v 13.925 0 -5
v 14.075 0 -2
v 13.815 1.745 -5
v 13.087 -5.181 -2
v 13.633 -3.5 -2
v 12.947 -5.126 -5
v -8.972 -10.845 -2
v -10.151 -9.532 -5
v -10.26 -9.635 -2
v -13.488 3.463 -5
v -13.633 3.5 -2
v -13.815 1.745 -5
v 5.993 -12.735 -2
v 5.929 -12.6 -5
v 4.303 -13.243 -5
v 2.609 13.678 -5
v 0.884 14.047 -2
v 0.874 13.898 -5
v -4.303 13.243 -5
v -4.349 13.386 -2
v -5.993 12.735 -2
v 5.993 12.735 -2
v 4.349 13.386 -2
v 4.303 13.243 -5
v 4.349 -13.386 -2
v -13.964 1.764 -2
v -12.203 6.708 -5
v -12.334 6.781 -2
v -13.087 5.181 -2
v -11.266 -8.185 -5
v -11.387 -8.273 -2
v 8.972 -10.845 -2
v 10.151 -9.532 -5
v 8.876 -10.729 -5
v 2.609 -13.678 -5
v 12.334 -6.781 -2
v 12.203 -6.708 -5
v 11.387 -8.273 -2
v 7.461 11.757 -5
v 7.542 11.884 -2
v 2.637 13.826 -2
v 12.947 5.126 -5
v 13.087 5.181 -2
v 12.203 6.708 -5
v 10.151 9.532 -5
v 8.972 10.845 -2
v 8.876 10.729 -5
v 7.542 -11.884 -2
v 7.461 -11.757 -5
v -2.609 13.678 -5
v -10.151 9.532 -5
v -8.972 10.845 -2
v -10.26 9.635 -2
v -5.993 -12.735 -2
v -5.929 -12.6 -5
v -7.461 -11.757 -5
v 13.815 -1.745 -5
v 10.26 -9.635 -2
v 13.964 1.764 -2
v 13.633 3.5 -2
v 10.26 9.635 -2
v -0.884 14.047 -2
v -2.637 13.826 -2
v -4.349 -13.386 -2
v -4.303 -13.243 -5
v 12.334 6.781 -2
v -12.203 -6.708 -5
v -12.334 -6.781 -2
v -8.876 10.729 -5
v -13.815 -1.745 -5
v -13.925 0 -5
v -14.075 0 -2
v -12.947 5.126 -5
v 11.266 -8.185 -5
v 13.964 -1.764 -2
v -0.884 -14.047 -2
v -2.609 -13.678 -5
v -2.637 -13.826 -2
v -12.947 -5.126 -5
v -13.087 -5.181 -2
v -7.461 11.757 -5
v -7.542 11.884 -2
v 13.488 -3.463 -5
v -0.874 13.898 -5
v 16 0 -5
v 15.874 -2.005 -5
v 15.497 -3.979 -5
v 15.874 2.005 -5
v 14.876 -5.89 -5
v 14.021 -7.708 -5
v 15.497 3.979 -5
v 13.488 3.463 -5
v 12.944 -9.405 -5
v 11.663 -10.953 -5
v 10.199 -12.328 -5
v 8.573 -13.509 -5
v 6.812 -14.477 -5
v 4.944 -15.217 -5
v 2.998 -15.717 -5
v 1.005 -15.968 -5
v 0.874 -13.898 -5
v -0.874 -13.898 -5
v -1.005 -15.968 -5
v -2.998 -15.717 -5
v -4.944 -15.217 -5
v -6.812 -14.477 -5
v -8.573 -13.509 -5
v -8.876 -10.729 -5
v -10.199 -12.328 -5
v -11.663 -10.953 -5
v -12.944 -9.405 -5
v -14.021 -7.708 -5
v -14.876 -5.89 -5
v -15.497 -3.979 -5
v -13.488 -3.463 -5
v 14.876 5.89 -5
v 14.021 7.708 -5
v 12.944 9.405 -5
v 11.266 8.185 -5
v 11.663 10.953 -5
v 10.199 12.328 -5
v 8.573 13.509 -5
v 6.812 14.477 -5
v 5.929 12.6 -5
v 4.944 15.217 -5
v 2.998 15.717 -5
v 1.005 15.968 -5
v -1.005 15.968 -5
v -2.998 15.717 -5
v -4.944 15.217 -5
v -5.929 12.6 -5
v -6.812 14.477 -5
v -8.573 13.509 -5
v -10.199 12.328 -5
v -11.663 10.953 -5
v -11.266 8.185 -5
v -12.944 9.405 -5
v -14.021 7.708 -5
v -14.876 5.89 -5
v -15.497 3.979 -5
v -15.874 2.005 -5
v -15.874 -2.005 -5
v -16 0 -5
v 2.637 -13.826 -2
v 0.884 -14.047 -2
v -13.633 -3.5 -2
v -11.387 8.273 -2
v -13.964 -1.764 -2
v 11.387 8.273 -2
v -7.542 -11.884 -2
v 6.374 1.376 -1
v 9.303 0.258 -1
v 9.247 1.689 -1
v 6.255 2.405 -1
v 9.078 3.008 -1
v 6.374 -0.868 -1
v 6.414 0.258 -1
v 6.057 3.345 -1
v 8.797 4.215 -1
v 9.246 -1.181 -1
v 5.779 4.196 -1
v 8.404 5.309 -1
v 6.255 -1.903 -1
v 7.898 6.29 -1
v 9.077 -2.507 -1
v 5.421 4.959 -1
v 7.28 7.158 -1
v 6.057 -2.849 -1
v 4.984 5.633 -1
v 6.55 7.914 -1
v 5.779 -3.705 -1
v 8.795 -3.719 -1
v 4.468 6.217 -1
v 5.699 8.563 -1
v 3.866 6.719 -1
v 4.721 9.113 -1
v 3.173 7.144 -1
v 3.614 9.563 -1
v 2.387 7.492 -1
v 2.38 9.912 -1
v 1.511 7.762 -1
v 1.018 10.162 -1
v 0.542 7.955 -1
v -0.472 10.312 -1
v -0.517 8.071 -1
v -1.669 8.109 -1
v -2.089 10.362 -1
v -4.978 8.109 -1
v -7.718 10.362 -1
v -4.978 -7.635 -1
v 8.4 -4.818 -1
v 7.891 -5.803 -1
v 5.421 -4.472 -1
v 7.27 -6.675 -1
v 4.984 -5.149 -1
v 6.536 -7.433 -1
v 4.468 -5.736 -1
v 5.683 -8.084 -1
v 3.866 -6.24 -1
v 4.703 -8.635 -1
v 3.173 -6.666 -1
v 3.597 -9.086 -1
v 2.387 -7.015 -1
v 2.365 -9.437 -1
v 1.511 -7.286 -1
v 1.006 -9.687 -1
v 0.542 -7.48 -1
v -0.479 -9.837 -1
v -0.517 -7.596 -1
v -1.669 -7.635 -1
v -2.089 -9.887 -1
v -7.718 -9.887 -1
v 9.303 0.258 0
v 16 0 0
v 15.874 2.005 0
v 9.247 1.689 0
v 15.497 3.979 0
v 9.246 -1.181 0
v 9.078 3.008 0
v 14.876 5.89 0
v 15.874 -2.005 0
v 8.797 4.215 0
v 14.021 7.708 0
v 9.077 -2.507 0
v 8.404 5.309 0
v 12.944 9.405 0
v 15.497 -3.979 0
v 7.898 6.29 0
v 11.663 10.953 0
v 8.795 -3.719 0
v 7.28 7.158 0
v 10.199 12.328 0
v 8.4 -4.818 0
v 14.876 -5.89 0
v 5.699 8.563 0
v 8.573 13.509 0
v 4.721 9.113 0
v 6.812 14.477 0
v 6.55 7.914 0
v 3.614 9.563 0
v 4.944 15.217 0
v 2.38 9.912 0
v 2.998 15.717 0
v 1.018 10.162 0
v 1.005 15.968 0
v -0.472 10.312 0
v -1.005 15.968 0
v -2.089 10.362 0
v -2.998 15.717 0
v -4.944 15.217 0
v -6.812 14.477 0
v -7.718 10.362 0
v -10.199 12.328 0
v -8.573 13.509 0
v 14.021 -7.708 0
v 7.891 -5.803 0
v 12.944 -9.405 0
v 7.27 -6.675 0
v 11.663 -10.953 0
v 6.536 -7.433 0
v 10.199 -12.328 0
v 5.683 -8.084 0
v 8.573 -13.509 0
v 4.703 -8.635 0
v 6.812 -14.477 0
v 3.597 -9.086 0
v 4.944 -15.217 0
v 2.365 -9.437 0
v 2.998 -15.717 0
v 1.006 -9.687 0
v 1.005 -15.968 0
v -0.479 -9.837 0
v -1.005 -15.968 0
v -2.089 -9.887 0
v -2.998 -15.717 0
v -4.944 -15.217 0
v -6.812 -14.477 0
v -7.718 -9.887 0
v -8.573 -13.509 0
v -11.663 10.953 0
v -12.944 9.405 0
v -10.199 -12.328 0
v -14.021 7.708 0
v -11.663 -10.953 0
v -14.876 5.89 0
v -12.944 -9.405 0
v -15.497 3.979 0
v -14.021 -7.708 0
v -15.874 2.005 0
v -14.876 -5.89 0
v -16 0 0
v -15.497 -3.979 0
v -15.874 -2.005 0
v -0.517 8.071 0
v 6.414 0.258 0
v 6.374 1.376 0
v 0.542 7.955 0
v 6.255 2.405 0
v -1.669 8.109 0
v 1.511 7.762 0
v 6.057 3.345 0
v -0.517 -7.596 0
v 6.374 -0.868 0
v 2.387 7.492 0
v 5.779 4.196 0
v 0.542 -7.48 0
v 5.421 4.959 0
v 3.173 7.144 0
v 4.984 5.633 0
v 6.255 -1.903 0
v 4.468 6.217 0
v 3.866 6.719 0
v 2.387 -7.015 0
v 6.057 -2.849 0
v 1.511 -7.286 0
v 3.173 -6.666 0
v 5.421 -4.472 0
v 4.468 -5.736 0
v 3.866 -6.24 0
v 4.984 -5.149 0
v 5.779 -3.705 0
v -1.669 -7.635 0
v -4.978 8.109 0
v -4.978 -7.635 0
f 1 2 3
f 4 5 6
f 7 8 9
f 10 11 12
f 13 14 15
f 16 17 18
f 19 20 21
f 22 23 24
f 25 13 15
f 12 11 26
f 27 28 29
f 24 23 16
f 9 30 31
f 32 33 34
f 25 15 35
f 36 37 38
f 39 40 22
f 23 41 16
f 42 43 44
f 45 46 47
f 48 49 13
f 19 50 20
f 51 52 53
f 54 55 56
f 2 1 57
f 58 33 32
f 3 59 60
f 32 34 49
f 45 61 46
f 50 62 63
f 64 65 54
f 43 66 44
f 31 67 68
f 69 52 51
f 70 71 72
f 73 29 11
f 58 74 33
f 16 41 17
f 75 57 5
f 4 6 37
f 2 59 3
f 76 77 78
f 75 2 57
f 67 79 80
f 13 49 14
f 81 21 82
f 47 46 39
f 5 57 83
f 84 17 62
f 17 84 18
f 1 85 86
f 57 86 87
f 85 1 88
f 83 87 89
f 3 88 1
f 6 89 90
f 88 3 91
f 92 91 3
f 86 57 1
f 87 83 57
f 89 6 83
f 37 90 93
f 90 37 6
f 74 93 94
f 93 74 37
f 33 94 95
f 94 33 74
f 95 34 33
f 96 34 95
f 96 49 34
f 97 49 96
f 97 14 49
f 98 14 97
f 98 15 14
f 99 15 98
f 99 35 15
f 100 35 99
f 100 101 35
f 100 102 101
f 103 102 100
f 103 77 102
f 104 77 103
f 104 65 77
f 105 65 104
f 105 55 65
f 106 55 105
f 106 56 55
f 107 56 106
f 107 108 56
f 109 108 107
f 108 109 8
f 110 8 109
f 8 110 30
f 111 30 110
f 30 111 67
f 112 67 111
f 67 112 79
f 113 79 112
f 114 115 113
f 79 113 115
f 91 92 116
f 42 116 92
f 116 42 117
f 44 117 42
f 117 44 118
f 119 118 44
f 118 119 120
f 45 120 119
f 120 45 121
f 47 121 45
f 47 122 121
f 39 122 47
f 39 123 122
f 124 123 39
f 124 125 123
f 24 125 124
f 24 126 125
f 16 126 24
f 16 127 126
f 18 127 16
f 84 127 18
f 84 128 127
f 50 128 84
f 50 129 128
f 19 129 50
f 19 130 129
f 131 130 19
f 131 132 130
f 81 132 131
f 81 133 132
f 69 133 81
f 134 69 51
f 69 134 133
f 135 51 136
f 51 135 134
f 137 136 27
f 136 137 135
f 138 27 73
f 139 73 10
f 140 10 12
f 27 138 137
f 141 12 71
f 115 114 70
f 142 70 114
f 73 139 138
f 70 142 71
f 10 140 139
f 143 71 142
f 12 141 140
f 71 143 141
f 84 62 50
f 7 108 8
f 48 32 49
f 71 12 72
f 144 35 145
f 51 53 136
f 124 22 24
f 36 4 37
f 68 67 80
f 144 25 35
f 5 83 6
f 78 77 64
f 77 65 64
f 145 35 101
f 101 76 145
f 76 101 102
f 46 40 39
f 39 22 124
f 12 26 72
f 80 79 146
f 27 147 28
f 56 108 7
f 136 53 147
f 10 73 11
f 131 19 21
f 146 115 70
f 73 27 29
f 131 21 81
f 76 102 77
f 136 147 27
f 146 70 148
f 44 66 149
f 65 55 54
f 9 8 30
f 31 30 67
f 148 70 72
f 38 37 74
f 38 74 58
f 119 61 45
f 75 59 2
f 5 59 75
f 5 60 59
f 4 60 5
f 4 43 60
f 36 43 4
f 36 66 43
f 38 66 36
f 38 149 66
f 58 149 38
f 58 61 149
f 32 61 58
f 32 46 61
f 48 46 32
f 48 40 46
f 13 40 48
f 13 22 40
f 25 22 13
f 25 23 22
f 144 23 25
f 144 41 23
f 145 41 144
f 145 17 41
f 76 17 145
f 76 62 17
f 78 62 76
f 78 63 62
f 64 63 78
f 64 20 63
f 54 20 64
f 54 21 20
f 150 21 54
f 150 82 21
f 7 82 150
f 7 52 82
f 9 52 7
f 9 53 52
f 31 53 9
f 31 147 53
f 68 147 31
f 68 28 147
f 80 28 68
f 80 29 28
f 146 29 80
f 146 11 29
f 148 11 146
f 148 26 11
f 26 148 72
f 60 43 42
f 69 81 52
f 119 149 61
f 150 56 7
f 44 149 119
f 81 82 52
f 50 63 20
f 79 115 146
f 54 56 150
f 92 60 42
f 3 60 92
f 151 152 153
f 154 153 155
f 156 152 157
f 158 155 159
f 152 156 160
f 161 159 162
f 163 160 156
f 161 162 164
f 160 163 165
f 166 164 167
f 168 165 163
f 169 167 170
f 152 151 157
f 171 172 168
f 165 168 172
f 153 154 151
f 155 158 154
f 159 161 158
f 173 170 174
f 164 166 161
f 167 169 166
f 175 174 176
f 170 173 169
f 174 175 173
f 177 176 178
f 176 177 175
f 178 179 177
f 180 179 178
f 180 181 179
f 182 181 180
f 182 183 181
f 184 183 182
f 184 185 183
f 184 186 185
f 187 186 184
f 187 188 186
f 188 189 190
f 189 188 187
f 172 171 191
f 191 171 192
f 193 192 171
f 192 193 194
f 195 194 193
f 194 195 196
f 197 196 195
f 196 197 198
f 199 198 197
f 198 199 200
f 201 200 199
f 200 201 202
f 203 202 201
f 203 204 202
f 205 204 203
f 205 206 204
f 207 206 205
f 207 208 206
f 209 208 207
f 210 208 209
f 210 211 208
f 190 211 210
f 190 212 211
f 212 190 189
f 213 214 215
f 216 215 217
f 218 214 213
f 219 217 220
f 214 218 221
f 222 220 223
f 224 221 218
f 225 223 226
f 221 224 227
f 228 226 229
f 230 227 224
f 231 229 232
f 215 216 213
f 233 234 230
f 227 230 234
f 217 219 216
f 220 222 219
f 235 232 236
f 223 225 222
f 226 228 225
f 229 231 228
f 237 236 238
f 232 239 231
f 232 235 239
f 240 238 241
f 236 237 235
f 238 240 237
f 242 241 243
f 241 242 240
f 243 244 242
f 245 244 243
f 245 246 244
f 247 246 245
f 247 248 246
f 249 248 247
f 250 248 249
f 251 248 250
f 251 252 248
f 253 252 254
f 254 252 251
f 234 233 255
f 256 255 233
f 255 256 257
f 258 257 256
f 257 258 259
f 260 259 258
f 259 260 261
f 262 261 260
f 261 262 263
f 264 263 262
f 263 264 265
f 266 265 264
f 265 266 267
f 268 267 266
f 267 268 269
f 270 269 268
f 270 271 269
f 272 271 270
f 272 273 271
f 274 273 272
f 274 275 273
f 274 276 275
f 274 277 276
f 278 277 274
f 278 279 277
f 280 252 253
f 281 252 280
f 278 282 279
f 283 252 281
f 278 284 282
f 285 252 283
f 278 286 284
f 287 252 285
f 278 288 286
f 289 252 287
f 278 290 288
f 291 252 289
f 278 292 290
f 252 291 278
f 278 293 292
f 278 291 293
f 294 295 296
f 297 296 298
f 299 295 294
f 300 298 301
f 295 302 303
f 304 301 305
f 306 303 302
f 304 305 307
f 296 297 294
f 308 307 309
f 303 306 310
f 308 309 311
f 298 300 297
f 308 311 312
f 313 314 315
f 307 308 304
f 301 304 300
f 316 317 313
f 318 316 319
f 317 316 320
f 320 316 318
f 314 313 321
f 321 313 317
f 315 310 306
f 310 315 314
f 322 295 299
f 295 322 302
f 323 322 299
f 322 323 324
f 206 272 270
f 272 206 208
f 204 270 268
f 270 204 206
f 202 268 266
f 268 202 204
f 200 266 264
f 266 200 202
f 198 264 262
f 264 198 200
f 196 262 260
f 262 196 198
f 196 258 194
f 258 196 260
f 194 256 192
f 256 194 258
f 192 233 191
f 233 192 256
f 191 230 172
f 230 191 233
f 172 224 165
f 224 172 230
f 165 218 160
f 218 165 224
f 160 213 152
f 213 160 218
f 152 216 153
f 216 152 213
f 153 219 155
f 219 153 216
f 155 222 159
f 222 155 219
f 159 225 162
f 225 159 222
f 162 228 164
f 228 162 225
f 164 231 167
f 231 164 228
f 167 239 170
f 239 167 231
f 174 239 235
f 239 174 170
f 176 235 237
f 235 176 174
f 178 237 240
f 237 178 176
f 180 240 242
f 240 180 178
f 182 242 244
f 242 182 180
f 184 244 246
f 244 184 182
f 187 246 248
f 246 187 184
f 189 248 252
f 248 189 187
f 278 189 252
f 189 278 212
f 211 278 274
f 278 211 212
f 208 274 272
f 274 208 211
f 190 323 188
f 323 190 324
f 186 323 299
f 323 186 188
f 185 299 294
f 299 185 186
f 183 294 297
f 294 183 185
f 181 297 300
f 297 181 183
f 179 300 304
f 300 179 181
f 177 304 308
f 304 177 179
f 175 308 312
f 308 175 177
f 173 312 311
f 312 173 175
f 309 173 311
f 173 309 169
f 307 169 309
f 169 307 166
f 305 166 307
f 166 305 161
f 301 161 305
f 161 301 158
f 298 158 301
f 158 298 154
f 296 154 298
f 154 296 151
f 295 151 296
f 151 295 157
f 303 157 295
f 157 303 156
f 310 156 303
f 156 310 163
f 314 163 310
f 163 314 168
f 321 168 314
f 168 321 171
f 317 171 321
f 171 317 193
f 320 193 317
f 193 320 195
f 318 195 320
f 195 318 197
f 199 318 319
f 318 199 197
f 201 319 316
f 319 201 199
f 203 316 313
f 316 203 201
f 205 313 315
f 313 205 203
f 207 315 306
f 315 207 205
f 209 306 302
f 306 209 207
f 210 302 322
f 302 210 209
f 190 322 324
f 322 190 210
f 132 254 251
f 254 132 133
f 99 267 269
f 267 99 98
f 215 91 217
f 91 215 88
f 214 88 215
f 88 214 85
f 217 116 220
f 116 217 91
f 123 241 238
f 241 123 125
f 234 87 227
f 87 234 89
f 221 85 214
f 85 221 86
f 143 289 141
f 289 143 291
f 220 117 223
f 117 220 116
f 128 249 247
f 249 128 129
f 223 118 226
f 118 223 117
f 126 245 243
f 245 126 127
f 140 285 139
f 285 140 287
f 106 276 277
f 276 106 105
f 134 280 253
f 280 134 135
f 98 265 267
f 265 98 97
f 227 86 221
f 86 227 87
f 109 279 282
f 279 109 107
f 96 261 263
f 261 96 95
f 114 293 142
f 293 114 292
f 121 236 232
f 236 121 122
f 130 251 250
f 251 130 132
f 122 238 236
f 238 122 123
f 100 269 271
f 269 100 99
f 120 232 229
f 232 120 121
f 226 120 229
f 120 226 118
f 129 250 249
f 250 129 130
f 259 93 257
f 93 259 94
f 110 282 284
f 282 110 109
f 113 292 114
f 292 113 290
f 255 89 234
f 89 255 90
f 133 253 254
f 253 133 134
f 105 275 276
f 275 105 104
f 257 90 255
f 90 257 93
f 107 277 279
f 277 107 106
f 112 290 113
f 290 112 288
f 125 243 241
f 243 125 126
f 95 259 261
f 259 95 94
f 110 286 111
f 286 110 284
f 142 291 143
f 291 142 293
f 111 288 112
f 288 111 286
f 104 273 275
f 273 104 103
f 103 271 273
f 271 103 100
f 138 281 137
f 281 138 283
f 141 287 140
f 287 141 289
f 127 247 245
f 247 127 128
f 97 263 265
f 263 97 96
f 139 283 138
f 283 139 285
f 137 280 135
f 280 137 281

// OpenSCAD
$fn = 50;


difference() {
	union() {
		translate(v = [0, 0, -5.0000000000]) {
			cylinder(h = 5, r = 16.0000000000);
		}
	}
	union() {
		#translate(v = [0, 0, -5.0000000000]) {
			cylinder(h = 3, r1 = 13.9250000000, r2 = 14.0750000000);
		}
		translate(v = [0, 0, -1]) {
			linear_extrude(height = 1) {
				text(font = "Impact", halign = "center", size = 20, text = "D", valign = "center");
			}
		}
	}
}
